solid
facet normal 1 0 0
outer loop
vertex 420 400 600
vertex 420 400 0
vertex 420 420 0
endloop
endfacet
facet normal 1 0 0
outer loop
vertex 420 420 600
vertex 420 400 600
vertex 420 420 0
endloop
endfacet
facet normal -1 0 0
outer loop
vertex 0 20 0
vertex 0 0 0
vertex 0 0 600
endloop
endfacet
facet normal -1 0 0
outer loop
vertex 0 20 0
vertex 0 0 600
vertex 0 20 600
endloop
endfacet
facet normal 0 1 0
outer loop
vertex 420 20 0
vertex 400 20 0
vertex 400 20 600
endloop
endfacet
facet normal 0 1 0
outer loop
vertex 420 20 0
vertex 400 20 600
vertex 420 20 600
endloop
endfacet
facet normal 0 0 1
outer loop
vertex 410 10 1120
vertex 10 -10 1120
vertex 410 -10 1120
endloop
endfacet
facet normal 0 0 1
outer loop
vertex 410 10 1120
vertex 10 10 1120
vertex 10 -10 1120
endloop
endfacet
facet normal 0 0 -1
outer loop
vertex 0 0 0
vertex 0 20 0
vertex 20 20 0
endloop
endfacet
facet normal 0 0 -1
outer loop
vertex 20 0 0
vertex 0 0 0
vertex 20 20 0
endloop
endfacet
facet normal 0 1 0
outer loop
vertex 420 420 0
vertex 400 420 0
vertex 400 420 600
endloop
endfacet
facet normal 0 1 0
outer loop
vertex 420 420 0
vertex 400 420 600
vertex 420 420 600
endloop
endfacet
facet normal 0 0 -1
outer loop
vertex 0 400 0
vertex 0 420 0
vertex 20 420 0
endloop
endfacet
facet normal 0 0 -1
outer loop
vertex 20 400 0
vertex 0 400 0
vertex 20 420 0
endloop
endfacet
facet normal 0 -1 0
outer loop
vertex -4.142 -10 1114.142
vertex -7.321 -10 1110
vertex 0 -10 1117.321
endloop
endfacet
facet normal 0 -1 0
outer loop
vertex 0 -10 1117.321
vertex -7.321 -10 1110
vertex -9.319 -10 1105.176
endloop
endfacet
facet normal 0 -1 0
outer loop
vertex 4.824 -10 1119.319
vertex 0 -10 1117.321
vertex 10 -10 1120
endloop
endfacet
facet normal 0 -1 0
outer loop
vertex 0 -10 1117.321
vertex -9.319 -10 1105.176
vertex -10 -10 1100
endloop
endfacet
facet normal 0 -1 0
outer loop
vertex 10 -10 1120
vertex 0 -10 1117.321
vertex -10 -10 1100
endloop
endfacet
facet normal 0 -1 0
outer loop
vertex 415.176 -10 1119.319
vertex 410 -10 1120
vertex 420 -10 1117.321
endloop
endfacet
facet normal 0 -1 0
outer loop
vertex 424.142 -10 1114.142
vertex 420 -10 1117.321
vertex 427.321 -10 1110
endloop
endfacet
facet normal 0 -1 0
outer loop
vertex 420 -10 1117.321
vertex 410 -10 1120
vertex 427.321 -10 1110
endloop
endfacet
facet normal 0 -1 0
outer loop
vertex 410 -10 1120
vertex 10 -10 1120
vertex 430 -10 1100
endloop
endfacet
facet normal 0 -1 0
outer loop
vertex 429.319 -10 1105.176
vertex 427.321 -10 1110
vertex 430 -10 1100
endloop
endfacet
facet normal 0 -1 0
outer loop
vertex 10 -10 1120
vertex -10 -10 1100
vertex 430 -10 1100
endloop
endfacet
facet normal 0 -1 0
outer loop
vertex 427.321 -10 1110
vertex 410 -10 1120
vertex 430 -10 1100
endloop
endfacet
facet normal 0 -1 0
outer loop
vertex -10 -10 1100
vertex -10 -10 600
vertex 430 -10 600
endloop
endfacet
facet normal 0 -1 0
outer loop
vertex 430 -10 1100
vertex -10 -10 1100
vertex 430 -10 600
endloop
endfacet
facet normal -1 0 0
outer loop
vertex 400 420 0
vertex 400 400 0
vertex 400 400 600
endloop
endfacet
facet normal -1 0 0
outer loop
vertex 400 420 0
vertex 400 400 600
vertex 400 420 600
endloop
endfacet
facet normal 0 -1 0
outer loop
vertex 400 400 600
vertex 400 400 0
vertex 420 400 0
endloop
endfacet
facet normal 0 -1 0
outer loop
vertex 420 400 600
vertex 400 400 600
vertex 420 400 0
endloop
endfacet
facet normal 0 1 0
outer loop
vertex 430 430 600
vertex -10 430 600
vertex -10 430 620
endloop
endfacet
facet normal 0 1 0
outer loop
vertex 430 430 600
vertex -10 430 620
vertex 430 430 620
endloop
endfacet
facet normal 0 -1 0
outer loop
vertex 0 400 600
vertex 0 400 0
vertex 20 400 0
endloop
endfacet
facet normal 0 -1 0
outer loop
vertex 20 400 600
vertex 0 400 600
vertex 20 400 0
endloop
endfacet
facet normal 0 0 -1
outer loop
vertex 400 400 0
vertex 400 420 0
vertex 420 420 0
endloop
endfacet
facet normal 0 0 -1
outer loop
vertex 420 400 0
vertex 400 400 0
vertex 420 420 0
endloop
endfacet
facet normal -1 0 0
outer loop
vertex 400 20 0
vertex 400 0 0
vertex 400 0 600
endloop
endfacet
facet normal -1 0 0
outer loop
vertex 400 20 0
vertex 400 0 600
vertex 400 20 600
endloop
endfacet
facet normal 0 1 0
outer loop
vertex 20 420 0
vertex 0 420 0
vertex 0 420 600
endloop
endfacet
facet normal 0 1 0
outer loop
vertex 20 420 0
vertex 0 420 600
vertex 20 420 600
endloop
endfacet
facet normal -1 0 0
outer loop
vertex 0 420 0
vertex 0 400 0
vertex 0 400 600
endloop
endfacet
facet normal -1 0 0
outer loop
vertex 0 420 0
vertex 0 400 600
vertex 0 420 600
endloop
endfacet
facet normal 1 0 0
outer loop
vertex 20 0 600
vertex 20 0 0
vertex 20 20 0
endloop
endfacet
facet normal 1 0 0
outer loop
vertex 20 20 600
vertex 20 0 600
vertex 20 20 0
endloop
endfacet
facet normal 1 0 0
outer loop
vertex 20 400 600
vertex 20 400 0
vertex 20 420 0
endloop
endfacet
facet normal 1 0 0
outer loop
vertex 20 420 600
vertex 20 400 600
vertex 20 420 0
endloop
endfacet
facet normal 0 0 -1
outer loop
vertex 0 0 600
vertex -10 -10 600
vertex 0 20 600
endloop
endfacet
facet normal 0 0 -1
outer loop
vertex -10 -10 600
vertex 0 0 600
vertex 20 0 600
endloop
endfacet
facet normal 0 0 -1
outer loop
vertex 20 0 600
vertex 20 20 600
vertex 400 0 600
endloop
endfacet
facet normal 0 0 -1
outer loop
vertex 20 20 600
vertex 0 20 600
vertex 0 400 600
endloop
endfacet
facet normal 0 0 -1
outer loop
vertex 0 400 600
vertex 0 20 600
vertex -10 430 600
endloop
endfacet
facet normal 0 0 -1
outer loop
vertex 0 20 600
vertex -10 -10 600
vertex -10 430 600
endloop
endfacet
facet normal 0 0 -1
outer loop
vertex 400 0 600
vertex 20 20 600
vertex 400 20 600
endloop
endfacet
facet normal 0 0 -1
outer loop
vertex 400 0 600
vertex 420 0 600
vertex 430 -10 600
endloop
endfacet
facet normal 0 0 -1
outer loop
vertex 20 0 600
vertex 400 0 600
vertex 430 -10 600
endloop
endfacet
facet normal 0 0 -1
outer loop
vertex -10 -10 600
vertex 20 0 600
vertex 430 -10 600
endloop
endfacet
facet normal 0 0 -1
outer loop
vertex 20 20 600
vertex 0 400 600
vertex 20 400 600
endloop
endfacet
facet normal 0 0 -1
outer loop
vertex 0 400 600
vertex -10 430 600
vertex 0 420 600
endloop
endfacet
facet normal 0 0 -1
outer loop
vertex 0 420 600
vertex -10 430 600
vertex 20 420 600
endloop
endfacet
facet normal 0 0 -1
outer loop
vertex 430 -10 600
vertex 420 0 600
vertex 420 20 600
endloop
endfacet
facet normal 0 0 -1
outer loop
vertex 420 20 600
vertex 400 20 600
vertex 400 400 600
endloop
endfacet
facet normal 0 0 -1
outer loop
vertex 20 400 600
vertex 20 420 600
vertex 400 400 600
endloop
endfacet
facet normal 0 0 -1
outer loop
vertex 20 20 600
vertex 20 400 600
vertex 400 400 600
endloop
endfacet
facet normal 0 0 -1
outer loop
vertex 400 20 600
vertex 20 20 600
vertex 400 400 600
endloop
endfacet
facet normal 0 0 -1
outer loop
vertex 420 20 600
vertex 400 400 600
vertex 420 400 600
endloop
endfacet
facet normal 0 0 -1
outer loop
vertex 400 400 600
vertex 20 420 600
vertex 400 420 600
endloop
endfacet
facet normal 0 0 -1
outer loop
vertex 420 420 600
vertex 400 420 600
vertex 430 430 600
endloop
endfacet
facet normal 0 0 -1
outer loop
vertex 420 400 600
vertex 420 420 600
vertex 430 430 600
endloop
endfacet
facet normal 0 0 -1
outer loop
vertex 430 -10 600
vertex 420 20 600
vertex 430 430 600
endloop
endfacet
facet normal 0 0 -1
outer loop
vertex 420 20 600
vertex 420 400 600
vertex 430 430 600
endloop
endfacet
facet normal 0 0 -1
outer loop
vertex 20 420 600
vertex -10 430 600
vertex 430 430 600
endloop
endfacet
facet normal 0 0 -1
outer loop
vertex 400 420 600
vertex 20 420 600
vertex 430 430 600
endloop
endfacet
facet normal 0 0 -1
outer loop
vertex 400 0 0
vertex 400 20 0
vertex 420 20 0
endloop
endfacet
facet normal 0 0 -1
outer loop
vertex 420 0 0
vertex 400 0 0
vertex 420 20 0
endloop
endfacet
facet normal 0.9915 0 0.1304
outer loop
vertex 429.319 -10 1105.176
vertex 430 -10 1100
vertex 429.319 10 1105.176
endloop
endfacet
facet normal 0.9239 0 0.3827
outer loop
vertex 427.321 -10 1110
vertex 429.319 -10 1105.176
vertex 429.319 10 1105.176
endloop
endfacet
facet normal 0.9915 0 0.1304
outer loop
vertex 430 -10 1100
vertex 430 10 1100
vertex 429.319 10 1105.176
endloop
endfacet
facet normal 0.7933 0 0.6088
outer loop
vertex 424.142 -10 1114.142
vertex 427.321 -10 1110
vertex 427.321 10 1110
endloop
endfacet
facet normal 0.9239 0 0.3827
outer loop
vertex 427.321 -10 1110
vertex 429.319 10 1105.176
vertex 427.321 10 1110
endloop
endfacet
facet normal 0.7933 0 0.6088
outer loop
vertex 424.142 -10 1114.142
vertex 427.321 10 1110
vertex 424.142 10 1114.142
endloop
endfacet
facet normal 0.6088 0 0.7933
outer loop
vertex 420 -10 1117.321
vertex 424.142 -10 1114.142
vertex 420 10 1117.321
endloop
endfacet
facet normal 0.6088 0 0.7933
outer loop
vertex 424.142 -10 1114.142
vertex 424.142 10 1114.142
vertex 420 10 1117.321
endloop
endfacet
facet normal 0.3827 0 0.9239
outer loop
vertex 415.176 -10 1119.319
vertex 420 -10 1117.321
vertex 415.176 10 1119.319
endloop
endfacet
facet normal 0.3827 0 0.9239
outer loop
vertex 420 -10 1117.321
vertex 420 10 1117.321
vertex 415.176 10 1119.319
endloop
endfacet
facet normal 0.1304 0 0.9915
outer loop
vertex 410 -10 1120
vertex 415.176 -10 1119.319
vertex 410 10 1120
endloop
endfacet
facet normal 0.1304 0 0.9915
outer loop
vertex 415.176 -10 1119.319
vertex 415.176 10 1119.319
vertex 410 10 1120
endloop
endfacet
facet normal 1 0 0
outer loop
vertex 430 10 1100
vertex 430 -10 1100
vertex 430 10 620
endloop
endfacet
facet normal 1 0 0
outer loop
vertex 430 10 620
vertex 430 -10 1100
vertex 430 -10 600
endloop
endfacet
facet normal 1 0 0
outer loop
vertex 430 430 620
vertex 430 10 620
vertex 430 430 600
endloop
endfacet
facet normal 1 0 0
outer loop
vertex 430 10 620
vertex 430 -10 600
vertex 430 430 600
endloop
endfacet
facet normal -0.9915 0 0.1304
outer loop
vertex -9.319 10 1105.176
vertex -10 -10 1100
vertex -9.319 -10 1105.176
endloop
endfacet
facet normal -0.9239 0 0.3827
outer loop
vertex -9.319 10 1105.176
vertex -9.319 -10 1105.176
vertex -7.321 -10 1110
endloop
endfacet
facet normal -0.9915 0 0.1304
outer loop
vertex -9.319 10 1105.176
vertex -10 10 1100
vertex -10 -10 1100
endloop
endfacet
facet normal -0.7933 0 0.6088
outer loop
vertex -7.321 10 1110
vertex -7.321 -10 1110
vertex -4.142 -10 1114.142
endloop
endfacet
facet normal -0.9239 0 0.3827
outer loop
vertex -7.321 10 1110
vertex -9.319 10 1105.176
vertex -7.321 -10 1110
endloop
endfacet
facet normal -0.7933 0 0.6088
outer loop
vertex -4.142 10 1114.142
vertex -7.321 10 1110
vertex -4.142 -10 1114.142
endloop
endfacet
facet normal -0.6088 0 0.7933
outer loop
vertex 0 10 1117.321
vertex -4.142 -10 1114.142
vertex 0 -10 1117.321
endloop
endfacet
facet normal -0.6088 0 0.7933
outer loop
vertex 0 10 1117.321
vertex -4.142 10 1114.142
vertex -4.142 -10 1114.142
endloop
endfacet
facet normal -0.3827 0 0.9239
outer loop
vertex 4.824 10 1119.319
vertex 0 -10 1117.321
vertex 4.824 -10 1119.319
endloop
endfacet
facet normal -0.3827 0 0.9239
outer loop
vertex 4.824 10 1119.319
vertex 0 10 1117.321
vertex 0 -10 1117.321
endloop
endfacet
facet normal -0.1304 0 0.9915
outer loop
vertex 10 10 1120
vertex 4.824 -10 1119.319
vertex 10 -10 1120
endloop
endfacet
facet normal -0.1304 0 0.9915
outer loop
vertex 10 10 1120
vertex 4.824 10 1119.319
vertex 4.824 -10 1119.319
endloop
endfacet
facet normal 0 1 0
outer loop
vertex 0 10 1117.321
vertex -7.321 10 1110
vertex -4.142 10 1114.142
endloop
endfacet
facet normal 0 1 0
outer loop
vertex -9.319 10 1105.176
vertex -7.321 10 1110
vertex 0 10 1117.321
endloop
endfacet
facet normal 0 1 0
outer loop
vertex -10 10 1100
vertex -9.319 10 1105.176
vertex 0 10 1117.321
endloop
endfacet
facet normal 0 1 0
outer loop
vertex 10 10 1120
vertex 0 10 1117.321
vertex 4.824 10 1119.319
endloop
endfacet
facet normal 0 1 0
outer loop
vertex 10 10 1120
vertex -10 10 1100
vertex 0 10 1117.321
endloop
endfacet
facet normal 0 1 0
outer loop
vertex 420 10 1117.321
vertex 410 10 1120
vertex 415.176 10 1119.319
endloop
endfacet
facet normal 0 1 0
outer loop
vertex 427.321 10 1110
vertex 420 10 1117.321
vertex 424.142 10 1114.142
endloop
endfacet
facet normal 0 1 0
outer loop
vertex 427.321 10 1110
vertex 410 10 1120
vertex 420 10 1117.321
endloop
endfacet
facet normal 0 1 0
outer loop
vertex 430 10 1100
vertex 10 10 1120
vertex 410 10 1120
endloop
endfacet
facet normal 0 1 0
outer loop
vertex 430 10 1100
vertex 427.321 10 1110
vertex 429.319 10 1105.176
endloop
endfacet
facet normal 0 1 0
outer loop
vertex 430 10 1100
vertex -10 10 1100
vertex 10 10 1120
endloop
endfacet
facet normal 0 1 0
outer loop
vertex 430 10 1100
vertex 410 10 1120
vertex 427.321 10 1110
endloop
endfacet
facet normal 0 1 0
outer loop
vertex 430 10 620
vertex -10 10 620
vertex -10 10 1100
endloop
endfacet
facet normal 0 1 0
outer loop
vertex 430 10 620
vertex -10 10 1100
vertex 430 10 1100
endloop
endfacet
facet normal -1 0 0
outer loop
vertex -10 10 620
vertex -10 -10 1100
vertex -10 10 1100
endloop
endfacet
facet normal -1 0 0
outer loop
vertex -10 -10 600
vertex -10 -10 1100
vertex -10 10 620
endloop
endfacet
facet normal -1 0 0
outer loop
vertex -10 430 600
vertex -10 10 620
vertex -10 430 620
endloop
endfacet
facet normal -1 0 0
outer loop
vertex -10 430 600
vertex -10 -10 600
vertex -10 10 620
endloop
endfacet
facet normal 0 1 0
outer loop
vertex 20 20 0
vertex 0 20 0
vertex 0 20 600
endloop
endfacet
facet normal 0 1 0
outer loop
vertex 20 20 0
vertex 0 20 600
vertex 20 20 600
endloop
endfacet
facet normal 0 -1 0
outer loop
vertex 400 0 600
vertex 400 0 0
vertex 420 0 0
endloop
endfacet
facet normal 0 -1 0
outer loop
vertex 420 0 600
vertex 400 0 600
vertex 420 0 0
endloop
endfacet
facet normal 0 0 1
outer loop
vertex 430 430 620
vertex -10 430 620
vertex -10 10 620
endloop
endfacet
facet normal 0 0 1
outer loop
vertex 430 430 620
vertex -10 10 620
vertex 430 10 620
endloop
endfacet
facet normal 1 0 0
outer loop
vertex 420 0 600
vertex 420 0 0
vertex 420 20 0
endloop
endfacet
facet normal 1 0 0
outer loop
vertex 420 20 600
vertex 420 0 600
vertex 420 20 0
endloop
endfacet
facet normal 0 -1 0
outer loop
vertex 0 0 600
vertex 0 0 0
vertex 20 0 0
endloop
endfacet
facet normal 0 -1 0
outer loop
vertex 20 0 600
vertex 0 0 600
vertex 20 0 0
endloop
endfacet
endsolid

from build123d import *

# Parameters (mm, degrees)
F0_W     = 20
F0_H     = 20
F1_DEPTH = 600
F2_W     = 440
F2_H     = 440
F3_DEPTH = 20
F4_W     = 440
F4_H     = 20
F5_DEPTH = 500
F6_R     = 20


with BuildPart() as f1:
    # F0 (on Top) → F1 (new body)
    with BuildSketch(Plane.XY):
        with Locations((10, 10)):
            Rectangle(F0_W, F0_H)
        with Locations((10, 410)):
            Rectangle(F0_W, F0_H)
        with Locations((410, 10)):
            Rectangle(F0_W, F0_H)
        with Locations((410, 410)):
            Rectangle(F0_W, F0_H)
    extrude(amount=F1_DEPTH)

    # F2 (on face) → F3 (join)
    with BuildSketch(Plane.XY.offset(600)):
        with Locations((210, 210)):
            Rectangle(F2_W, F2_H)
    extrude(amount=F3_DEPTH)

    # F4 (on face) → F5 (join)
    with BuildSketch(Plane.XY.offset(620)):
        with Locations((210, 0)):
            Rectangle(F4_W, F4_H)
    extrude(amount=F5_DEPTH)

    # F6
    f6_edges = [f1.edges().sort_by_distance(p)[0] for p in [
        (430, 0, 1120),
        (-10, 0, 1120),
    ]]
    fillet(f6_edges, radius=F6_R)


solid = f1.part
